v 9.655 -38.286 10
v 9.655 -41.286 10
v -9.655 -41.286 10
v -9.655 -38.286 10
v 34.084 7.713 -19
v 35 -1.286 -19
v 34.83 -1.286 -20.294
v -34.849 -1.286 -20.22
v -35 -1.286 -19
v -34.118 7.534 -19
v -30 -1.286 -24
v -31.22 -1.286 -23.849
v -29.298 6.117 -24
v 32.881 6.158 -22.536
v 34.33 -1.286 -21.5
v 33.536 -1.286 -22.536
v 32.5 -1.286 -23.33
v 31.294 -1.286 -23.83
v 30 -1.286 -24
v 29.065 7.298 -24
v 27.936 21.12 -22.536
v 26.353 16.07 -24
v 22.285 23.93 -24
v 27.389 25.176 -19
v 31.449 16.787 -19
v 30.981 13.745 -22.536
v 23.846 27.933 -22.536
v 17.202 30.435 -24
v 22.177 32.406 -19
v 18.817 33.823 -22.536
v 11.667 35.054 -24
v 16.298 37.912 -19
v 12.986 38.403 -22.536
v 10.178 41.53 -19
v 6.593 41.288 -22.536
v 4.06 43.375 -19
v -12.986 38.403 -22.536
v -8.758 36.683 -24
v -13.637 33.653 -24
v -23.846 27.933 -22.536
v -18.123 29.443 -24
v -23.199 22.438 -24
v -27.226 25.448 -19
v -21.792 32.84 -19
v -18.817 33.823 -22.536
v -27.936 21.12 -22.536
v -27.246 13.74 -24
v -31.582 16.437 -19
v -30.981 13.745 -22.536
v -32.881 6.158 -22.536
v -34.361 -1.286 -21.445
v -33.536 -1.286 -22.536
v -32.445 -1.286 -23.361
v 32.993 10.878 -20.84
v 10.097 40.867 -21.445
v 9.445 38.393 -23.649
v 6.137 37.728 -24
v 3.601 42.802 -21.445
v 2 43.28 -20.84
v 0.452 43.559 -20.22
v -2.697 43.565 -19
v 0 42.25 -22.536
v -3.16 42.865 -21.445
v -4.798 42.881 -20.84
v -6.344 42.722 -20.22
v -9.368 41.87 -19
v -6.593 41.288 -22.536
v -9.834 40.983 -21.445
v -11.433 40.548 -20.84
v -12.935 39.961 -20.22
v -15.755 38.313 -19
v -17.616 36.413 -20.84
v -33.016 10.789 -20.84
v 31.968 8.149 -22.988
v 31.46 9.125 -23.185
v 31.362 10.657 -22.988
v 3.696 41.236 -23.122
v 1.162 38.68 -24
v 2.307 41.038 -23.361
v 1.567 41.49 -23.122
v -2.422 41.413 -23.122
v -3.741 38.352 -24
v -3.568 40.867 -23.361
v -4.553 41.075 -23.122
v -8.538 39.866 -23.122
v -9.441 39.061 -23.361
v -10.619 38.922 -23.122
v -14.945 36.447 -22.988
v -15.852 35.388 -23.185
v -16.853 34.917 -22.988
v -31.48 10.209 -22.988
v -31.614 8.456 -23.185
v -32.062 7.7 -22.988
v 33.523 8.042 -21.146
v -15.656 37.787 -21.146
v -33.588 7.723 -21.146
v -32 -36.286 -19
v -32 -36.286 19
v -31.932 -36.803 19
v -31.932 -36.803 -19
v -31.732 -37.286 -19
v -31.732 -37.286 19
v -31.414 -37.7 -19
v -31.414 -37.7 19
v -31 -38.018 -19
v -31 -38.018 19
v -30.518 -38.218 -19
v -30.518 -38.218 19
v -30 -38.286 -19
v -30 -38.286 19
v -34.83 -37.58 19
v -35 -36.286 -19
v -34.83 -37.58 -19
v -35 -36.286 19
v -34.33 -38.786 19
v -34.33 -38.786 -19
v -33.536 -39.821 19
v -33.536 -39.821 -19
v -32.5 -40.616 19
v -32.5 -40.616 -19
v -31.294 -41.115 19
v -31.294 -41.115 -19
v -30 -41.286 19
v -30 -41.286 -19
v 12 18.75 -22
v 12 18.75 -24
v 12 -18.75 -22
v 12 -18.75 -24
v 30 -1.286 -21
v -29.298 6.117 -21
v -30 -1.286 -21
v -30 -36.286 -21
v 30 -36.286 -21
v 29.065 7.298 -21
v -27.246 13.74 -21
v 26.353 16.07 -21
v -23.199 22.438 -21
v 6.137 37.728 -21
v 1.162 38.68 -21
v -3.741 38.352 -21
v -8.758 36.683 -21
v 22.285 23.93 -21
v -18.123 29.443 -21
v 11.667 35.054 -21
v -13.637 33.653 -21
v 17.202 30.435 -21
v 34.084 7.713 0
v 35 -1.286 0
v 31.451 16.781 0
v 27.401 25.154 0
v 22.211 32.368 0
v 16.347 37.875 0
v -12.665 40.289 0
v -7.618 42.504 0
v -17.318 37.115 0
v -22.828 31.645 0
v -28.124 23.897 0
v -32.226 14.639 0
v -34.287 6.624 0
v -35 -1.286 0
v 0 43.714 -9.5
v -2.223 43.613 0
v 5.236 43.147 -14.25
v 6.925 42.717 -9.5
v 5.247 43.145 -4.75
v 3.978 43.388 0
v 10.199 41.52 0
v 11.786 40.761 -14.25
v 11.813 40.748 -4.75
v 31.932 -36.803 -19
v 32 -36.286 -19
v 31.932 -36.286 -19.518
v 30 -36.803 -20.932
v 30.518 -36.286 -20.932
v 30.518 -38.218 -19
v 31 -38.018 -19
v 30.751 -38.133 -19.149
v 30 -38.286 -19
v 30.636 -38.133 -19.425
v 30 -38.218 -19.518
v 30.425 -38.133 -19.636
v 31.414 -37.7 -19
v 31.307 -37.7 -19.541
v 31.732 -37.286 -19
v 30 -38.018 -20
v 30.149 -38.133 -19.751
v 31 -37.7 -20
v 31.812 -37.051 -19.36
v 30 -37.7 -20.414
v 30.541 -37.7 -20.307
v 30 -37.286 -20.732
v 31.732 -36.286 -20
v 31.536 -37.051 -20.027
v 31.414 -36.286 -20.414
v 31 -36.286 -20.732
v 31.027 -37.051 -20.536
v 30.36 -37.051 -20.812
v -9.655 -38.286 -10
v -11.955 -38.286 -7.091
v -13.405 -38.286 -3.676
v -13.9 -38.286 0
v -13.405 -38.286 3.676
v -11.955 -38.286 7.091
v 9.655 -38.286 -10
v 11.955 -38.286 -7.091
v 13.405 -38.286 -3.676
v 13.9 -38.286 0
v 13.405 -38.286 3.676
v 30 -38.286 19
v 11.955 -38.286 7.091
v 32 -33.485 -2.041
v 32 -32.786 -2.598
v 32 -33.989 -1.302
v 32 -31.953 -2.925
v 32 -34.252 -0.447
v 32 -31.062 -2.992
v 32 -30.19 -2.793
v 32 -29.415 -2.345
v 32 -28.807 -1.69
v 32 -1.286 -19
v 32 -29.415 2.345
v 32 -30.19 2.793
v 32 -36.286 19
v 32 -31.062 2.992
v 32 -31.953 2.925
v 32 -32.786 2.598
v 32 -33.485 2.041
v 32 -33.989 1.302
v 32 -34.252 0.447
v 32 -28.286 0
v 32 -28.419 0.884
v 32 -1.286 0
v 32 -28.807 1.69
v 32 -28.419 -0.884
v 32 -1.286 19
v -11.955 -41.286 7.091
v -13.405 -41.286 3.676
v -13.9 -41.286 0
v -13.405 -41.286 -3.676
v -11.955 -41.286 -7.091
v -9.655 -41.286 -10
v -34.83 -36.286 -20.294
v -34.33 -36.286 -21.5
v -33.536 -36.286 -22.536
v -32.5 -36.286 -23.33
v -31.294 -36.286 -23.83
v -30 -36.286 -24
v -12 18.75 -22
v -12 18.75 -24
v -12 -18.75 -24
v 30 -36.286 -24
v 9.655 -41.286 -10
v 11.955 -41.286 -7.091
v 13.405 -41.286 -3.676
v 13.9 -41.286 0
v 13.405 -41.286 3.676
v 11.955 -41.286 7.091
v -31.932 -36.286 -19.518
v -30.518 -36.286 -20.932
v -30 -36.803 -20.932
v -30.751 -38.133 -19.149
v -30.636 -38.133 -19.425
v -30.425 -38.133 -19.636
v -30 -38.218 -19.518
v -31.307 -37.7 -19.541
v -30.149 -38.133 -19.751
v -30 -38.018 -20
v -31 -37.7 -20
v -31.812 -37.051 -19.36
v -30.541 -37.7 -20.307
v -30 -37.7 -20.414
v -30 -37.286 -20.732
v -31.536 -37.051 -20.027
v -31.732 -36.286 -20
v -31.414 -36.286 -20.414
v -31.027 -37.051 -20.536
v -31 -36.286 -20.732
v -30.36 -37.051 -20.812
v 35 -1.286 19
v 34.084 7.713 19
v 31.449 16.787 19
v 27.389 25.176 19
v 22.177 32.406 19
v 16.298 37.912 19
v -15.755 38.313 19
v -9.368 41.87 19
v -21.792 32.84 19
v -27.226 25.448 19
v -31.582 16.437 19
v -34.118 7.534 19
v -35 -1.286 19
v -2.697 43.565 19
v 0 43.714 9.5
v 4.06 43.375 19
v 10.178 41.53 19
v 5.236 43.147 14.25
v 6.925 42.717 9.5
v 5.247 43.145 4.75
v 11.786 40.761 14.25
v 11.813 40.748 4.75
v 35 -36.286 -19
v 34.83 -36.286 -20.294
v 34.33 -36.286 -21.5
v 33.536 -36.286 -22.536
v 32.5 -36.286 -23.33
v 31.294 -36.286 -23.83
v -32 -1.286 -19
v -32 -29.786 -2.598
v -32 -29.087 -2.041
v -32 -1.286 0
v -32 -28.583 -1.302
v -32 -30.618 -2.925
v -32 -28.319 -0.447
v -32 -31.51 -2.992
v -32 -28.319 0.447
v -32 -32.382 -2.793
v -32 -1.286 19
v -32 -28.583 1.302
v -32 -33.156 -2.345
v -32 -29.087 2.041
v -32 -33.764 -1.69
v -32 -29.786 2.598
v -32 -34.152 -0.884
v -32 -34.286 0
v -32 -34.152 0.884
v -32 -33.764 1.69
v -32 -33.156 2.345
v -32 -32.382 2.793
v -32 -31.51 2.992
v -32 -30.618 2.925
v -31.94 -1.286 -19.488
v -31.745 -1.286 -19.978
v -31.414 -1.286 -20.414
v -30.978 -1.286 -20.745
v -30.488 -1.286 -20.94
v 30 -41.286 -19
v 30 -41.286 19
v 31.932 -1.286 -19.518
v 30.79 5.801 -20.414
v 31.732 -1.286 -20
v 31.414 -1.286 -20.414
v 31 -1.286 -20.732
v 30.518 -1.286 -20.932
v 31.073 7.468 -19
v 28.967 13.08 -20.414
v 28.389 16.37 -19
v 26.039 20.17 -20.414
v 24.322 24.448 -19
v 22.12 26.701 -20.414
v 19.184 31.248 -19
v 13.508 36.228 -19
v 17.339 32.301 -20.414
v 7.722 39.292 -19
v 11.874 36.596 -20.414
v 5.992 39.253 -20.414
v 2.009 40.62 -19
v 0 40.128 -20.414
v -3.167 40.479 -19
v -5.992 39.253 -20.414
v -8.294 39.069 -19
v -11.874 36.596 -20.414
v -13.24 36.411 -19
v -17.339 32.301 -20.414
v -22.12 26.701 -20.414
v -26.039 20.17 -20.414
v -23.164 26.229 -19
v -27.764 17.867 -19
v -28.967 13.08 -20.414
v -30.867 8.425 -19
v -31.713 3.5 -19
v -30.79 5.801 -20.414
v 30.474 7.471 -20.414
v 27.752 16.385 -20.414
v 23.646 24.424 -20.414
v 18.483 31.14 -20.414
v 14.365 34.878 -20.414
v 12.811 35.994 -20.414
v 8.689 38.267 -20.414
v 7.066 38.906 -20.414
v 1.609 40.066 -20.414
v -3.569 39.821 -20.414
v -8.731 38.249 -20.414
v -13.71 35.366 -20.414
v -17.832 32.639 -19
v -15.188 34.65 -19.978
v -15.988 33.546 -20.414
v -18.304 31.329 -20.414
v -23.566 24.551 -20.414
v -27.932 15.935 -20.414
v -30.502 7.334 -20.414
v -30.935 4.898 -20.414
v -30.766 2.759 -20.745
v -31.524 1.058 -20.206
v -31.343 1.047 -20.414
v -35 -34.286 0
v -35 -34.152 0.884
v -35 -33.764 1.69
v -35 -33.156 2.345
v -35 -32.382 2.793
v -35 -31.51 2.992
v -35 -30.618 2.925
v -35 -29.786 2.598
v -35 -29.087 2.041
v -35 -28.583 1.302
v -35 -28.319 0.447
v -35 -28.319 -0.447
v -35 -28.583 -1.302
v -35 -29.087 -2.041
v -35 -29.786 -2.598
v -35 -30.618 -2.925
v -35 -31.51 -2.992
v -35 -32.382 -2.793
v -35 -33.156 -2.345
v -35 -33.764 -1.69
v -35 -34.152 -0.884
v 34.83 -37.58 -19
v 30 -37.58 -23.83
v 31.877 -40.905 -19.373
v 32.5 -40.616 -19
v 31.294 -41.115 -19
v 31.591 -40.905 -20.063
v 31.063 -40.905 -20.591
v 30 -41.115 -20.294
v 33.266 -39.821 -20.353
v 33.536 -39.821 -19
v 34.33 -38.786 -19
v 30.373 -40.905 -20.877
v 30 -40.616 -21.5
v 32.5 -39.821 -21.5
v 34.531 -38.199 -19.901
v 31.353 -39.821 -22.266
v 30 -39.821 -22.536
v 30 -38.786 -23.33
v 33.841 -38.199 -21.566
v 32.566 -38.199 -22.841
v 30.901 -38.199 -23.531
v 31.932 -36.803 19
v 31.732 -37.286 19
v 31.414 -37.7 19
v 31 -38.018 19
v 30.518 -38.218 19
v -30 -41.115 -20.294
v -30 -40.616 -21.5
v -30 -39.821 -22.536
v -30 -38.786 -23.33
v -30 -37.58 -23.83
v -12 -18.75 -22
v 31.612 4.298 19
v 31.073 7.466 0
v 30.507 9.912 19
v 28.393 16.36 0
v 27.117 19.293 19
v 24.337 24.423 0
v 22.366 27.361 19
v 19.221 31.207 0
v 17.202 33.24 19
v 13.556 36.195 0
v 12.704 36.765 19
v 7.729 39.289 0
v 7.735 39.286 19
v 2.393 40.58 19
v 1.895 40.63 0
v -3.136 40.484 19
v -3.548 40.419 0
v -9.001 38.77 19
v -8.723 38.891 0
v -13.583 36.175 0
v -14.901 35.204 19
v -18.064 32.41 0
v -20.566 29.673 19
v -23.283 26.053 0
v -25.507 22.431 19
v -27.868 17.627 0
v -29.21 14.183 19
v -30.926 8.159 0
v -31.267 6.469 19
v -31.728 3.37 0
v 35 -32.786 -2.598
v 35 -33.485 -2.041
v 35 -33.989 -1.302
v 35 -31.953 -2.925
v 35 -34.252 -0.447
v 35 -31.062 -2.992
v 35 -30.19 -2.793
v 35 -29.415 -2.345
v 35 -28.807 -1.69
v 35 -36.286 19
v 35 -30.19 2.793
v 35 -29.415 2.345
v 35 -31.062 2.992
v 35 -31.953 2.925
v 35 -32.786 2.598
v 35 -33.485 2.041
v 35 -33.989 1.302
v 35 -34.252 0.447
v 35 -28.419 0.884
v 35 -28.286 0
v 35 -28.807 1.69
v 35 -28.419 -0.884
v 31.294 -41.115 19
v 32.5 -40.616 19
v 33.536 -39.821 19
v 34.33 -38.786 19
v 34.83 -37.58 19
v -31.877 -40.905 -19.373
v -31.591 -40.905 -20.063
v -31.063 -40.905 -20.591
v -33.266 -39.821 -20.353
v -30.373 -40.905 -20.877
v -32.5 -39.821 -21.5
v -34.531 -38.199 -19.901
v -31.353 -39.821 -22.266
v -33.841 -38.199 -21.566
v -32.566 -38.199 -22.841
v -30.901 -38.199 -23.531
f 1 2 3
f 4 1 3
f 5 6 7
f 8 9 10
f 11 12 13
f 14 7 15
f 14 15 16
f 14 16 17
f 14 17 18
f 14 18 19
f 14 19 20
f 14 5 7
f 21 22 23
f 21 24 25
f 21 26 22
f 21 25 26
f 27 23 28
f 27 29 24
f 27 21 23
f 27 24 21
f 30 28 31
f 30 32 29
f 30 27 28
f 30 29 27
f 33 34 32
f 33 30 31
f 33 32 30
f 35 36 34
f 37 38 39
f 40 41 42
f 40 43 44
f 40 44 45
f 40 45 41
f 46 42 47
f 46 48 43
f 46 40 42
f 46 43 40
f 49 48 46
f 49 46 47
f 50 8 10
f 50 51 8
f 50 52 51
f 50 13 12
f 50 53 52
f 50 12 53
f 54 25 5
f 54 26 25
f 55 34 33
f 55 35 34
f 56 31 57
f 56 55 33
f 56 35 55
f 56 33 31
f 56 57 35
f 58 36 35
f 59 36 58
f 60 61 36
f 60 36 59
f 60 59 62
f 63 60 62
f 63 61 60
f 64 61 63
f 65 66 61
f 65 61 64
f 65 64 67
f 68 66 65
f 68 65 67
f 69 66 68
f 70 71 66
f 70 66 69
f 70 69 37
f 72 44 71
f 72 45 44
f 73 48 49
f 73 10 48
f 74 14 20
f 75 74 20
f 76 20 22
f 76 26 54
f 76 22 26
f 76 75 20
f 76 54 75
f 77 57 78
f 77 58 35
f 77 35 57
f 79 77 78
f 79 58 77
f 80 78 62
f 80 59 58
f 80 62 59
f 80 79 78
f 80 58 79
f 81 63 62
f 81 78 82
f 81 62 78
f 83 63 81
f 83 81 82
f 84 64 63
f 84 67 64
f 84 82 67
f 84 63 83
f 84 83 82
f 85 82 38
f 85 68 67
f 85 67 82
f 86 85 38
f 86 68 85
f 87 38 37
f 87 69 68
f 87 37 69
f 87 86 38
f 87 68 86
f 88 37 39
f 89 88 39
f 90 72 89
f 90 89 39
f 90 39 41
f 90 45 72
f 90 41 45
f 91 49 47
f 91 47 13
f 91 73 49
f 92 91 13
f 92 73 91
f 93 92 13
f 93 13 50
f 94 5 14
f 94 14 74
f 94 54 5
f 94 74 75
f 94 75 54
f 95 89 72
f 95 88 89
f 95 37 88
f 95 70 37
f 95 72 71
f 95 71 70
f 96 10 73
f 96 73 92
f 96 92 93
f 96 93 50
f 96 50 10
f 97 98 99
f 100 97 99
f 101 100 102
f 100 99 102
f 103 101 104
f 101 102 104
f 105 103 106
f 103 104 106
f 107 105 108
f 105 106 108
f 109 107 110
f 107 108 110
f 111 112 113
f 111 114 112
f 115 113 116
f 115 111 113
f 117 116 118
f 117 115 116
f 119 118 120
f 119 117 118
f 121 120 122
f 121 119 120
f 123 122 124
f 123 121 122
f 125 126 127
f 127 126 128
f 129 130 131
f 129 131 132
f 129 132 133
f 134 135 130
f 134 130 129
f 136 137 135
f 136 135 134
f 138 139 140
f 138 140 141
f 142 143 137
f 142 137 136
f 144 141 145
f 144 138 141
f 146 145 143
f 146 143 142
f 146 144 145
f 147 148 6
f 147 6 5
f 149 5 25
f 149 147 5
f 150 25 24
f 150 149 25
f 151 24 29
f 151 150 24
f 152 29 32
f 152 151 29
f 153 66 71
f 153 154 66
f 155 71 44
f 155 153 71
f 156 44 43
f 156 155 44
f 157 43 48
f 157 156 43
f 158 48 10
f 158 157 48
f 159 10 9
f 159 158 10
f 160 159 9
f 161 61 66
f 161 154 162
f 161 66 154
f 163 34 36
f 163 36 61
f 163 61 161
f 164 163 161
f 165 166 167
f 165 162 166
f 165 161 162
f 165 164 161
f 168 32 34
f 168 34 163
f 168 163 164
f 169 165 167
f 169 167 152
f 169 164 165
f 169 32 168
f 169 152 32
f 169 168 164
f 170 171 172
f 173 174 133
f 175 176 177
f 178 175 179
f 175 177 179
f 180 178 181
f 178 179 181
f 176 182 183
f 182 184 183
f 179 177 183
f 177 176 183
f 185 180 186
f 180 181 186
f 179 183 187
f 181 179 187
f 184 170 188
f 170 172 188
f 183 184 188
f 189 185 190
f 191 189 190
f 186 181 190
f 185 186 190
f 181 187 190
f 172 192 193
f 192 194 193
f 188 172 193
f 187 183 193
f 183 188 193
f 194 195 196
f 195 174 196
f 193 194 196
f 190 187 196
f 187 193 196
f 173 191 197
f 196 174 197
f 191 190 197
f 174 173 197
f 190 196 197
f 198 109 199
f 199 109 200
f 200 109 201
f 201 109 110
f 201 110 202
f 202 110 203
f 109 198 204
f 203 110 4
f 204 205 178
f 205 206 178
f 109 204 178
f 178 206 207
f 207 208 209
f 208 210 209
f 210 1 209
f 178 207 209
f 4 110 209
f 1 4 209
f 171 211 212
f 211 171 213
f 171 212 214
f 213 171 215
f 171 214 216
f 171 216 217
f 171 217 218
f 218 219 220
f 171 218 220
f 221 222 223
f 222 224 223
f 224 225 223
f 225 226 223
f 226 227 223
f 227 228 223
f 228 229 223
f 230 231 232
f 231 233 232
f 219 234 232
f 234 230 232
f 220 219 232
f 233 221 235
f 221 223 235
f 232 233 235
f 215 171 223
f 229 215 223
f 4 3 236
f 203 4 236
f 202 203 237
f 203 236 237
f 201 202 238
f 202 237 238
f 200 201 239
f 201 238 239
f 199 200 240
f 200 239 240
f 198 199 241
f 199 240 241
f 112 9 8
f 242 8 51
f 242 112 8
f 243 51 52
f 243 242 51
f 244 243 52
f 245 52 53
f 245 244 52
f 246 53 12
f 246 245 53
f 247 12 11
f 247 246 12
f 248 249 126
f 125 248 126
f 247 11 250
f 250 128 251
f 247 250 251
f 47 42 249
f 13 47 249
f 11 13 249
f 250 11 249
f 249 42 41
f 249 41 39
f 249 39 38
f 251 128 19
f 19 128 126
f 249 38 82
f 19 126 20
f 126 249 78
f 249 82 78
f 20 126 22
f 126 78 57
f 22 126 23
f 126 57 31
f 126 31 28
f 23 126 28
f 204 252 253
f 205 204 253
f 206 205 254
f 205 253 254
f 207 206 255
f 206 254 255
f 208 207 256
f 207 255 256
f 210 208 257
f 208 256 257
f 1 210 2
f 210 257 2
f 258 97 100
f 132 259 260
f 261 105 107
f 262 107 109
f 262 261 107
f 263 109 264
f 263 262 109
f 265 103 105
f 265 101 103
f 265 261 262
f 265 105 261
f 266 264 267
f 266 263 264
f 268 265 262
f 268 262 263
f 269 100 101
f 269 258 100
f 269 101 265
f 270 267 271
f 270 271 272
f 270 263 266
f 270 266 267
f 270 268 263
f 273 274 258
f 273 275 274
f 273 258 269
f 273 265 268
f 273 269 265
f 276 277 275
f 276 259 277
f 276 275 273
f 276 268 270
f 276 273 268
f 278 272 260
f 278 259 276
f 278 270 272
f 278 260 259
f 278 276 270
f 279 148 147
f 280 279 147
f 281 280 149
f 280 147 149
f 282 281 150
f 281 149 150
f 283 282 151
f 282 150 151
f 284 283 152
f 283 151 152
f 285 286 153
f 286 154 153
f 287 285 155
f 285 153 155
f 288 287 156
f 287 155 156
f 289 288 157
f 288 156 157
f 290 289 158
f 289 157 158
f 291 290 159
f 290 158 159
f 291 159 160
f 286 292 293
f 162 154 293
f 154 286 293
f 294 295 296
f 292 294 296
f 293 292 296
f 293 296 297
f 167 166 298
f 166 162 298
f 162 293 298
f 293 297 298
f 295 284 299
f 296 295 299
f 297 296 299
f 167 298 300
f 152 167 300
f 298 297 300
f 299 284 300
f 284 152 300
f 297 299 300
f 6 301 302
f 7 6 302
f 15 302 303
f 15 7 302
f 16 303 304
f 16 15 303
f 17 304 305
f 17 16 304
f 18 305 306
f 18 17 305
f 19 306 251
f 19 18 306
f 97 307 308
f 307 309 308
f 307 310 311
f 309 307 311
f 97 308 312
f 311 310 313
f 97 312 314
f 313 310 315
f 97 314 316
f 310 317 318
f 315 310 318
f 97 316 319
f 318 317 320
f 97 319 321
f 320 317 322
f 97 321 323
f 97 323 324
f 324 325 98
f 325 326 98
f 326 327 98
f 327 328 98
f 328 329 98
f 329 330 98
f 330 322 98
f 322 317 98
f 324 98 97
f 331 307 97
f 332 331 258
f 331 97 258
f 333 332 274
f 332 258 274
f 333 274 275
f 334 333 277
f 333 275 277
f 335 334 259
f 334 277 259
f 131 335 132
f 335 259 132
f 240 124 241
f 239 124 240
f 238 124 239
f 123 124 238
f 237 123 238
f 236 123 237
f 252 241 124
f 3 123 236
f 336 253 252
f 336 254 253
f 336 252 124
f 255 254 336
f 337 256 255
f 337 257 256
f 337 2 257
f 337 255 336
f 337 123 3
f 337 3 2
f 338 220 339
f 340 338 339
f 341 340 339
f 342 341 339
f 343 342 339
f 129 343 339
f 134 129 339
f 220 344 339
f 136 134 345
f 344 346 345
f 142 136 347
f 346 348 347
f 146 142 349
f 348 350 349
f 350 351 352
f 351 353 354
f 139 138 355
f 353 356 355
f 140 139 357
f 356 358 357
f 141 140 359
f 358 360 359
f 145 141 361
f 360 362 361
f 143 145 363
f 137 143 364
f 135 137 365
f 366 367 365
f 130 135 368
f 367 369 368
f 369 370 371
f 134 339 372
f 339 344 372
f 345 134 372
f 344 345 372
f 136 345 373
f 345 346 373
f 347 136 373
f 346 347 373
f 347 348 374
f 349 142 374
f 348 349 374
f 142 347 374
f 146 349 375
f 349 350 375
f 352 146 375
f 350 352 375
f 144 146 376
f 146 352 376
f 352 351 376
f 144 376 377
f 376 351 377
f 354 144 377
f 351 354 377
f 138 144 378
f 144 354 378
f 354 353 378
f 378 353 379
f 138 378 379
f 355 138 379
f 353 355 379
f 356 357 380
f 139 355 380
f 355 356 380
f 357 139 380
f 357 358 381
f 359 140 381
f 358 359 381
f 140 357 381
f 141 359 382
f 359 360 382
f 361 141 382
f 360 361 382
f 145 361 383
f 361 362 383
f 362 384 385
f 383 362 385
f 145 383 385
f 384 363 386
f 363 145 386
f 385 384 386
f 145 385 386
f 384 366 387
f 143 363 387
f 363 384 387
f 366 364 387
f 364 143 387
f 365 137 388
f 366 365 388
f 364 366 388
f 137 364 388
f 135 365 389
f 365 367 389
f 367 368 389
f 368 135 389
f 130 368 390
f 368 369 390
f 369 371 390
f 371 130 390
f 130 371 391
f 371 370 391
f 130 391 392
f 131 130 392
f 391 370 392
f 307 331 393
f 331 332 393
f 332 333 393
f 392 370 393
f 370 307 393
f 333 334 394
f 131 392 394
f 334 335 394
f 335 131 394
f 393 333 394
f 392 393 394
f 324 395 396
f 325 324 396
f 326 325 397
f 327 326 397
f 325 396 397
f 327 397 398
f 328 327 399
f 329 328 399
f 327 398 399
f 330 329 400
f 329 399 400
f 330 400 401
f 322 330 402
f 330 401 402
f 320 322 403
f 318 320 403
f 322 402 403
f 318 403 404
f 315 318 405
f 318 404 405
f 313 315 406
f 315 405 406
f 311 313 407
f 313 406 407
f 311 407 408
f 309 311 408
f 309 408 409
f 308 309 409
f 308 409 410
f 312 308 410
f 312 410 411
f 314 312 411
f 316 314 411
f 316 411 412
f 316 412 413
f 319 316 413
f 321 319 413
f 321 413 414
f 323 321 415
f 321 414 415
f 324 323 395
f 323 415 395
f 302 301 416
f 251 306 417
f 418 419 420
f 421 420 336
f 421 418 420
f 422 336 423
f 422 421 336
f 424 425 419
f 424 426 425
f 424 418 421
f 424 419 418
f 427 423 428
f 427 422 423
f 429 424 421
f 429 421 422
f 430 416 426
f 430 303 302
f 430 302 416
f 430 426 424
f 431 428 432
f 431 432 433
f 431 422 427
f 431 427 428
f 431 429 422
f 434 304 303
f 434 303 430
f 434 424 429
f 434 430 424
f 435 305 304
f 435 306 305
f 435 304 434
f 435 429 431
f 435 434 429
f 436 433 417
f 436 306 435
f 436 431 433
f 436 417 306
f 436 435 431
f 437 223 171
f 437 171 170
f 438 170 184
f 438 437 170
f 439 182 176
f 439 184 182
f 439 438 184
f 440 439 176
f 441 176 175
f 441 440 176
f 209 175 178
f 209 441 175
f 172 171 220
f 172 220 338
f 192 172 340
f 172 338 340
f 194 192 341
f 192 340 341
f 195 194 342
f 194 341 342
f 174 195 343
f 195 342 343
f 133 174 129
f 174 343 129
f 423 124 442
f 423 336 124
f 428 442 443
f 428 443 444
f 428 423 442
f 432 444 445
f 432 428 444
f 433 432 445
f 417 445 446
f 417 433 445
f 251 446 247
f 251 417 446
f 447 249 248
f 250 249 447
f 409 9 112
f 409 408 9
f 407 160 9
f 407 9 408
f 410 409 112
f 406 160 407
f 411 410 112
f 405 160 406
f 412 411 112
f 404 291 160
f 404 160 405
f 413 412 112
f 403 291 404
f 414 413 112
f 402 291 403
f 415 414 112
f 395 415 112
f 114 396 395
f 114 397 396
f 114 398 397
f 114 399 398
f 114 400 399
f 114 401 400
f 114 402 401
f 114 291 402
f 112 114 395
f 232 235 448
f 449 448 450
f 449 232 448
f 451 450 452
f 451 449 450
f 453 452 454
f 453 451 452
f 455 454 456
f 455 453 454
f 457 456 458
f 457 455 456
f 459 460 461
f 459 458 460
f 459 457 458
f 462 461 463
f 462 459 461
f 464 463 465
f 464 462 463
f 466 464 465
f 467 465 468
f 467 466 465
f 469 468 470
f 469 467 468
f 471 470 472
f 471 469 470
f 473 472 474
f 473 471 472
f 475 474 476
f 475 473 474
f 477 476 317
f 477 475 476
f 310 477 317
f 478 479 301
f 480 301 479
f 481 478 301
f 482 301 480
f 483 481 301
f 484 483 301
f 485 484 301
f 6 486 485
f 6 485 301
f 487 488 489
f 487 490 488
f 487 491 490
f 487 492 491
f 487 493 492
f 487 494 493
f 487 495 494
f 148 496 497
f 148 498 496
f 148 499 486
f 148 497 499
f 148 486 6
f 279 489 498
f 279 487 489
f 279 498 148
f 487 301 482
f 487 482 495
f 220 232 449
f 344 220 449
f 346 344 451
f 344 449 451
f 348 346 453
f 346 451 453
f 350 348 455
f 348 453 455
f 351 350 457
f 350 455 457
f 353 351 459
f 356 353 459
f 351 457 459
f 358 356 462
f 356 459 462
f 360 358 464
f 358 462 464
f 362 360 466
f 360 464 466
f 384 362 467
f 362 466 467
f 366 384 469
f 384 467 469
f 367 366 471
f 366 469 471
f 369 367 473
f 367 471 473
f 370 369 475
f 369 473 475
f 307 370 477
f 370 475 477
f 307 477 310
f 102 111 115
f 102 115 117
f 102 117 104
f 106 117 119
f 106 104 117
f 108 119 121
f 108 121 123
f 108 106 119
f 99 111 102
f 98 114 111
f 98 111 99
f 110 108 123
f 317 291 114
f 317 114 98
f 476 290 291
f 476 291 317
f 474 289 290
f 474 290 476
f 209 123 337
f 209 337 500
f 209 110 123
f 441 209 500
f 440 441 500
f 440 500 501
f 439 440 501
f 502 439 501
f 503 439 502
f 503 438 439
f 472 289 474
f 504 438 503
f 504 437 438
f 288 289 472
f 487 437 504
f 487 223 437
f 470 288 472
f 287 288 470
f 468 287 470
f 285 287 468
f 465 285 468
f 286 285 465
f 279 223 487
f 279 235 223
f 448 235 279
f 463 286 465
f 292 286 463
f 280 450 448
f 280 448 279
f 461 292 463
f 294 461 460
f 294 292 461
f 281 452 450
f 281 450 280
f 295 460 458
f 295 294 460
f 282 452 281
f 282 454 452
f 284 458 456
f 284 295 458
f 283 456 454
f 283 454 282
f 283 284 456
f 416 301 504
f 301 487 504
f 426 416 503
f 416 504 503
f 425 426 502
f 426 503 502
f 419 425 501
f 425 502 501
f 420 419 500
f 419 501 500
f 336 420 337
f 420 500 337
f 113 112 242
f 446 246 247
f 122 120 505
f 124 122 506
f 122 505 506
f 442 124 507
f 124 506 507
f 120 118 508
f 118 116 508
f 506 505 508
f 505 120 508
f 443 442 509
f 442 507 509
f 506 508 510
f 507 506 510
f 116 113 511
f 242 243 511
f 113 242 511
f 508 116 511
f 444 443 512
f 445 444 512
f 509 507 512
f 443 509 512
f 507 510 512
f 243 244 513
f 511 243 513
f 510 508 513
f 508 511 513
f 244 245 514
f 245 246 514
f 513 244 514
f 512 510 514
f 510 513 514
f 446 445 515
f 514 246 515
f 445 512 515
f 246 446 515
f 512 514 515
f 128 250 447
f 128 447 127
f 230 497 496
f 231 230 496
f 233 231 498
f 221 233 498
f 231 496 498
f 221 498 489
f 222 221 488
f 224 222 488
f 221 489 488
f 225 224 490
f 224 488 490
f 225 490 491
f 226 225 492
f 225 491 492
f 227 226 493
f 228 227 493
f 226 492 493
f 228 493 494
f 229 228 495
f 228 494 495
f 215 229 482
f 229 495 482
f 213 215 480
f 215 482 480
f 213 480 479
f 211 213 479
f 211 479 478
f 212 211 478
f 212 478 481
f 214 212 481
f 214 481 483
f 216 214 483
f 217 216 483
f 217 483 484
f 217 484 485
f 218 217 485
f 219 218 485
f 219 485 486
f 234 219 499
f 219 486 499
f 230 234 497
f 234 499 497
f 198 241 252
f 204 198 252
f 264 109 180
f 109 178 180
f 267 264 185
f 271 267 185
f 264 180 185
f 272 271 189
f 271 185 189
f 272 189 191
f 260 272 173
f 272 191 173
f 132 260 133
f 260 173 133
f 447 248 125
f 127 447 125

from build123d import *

# Parameters (mm, degrees)
F1_DEPTH  = 24
F4_R      = 5
F5_W      = 91.2617743015
F5_H      = 146.8465328217
F6_DEPTH  = 5
F7_T      = -3
F9_W      = 24
F9_H      = 37.5
F10_DEPTH = 2
F11_DEPTH = 3
F13_R     = 3
F15_DEPTH = 3
F14_R     = 3
F16_DEPTH = 3


with BuildPart() as f1:
    # F0 (on Top) → F1 (new body, symmetric)
    with BuildSketch(Plane.XY):
        with BuildLine():
            Line((-35, -1.2857098173), (-35, -41.2857098173))
            Line((-35, -41.2857098173), (35, -41.2857098173))
            Line((35, -41.2857098173), (35, -1.2857098173))
            add(Edge.make_bspline(
                [(0, 43.7142857143), (20.1986748725, 43.7142857143), (35, 18.7647750933), (35, -1.2857098173)],
                knots=[0, 0, 0, 0, 57.0087677278, 57.0087677278, 57.0087677278, 57.0087677278], degree=3))
            add(Edge.make_bspline(
                [(0, 43.7142857143), (-20.1986748725, 43.7142857143), (-35, 18.7647750933), (-35, -1.2857098173)],
                knots=[0, 0, 0, 0, 57.0087677278, 57.0087677278, 57.0087677278, 57.0087677278], degree=3))
        make_face()
    extrude(amount=F1_DEPTH, both=True)

    # F4
    f4_edges = [f1.edges().sort_by_distance(p)[0] for p in [
        (-35, -21.28571, -24),
        (-25.571688, 28.021772, -24),
        (0, -41.28571, 24),
        (-35, -21.28571, 24),
        (-35, -41.28571, 0),
        (35, -41.28571, 0),
        (0, -41.28571, -24),
    ]]
    fillet(f4_edges, radius=F4_R)

    # F5 (on face) → F6 (cut)
    with BuildSketch(Plane.XY.offset(24)):
        Rectangle(F5_W, F5_H)
    extrude(amount=-F6_DEPTH, mode=Mode.SUBTRACT)

    # F7
    f7_openings = [f1.faces().sort_by_distance(p)[0] for p in [
        (0, -3.179771, 19),
    ]]
    offset(amount=F7_T, openings=f7_openings, kind=Kind.INTERSECTION)

    # F9 (on face) → F10 (cut)
    with BuildSketch(Plane(origin=(0, 0, -24), x_dir=(1, 0, 0), z_dir=(0, 0, -1))):
        Rectangle(F9_W, F9_H)
    extrude(amount=-F10_DEPTH, mode=Mode.SUBTRACT)

    # F8 (on face) → F11 (cut)
    with BuildSketch(Plane.XZ.offset(41.2857098173)):
        with BuildLine():
            Line((9.6545326143, 10), (0, 10))
            Line((0, 10), (0, 0))
            Line((0, 0), (0, -10))
            Line((0, -10), (9.6545326143, -10))
            ThreePointArc((9.6545326143, -10), (13.9, 0), (9.6545326143, 10))
        make_face()
        with BuildLine():
            Line((0, 10), (-9.6545326143, 10))
            ThreePointArc((-9.6545326143, 10), (-13.9, 0), (-9.6545326143, -10))
            Line((-9.6545326143, -10), (0, -10))
            Line((0, -10), (0, 0))
            Line((0, 0), (0, 10))
        make_face()
    extrude(amount=-F11_DEPTH, mode=Mode.SUBTRACT)

    # F13 (on face) → F15 (cut)
    with BuildSketch(Plane(origin=(-35, 0, 0), x_dir=(0, -1, 0), z_dir=(-1, 0, 0))):
        with Locations((31.2857098173, 0)):
            Circle(F13_R)
    extrude(amount=-F15_DEPTH, mode=Mode.SUBTRACT)

    # F14 (on face) → F16 (cut)
    with BuildSketch(Plane.YZ.offset(35)):
        with Locations((-31.2857098173, 0)):
            Circle(F14_R)
    extrude(amount=-F16_DEPTH, mode=Mode.SUBTRACT)


solid = f1.part
